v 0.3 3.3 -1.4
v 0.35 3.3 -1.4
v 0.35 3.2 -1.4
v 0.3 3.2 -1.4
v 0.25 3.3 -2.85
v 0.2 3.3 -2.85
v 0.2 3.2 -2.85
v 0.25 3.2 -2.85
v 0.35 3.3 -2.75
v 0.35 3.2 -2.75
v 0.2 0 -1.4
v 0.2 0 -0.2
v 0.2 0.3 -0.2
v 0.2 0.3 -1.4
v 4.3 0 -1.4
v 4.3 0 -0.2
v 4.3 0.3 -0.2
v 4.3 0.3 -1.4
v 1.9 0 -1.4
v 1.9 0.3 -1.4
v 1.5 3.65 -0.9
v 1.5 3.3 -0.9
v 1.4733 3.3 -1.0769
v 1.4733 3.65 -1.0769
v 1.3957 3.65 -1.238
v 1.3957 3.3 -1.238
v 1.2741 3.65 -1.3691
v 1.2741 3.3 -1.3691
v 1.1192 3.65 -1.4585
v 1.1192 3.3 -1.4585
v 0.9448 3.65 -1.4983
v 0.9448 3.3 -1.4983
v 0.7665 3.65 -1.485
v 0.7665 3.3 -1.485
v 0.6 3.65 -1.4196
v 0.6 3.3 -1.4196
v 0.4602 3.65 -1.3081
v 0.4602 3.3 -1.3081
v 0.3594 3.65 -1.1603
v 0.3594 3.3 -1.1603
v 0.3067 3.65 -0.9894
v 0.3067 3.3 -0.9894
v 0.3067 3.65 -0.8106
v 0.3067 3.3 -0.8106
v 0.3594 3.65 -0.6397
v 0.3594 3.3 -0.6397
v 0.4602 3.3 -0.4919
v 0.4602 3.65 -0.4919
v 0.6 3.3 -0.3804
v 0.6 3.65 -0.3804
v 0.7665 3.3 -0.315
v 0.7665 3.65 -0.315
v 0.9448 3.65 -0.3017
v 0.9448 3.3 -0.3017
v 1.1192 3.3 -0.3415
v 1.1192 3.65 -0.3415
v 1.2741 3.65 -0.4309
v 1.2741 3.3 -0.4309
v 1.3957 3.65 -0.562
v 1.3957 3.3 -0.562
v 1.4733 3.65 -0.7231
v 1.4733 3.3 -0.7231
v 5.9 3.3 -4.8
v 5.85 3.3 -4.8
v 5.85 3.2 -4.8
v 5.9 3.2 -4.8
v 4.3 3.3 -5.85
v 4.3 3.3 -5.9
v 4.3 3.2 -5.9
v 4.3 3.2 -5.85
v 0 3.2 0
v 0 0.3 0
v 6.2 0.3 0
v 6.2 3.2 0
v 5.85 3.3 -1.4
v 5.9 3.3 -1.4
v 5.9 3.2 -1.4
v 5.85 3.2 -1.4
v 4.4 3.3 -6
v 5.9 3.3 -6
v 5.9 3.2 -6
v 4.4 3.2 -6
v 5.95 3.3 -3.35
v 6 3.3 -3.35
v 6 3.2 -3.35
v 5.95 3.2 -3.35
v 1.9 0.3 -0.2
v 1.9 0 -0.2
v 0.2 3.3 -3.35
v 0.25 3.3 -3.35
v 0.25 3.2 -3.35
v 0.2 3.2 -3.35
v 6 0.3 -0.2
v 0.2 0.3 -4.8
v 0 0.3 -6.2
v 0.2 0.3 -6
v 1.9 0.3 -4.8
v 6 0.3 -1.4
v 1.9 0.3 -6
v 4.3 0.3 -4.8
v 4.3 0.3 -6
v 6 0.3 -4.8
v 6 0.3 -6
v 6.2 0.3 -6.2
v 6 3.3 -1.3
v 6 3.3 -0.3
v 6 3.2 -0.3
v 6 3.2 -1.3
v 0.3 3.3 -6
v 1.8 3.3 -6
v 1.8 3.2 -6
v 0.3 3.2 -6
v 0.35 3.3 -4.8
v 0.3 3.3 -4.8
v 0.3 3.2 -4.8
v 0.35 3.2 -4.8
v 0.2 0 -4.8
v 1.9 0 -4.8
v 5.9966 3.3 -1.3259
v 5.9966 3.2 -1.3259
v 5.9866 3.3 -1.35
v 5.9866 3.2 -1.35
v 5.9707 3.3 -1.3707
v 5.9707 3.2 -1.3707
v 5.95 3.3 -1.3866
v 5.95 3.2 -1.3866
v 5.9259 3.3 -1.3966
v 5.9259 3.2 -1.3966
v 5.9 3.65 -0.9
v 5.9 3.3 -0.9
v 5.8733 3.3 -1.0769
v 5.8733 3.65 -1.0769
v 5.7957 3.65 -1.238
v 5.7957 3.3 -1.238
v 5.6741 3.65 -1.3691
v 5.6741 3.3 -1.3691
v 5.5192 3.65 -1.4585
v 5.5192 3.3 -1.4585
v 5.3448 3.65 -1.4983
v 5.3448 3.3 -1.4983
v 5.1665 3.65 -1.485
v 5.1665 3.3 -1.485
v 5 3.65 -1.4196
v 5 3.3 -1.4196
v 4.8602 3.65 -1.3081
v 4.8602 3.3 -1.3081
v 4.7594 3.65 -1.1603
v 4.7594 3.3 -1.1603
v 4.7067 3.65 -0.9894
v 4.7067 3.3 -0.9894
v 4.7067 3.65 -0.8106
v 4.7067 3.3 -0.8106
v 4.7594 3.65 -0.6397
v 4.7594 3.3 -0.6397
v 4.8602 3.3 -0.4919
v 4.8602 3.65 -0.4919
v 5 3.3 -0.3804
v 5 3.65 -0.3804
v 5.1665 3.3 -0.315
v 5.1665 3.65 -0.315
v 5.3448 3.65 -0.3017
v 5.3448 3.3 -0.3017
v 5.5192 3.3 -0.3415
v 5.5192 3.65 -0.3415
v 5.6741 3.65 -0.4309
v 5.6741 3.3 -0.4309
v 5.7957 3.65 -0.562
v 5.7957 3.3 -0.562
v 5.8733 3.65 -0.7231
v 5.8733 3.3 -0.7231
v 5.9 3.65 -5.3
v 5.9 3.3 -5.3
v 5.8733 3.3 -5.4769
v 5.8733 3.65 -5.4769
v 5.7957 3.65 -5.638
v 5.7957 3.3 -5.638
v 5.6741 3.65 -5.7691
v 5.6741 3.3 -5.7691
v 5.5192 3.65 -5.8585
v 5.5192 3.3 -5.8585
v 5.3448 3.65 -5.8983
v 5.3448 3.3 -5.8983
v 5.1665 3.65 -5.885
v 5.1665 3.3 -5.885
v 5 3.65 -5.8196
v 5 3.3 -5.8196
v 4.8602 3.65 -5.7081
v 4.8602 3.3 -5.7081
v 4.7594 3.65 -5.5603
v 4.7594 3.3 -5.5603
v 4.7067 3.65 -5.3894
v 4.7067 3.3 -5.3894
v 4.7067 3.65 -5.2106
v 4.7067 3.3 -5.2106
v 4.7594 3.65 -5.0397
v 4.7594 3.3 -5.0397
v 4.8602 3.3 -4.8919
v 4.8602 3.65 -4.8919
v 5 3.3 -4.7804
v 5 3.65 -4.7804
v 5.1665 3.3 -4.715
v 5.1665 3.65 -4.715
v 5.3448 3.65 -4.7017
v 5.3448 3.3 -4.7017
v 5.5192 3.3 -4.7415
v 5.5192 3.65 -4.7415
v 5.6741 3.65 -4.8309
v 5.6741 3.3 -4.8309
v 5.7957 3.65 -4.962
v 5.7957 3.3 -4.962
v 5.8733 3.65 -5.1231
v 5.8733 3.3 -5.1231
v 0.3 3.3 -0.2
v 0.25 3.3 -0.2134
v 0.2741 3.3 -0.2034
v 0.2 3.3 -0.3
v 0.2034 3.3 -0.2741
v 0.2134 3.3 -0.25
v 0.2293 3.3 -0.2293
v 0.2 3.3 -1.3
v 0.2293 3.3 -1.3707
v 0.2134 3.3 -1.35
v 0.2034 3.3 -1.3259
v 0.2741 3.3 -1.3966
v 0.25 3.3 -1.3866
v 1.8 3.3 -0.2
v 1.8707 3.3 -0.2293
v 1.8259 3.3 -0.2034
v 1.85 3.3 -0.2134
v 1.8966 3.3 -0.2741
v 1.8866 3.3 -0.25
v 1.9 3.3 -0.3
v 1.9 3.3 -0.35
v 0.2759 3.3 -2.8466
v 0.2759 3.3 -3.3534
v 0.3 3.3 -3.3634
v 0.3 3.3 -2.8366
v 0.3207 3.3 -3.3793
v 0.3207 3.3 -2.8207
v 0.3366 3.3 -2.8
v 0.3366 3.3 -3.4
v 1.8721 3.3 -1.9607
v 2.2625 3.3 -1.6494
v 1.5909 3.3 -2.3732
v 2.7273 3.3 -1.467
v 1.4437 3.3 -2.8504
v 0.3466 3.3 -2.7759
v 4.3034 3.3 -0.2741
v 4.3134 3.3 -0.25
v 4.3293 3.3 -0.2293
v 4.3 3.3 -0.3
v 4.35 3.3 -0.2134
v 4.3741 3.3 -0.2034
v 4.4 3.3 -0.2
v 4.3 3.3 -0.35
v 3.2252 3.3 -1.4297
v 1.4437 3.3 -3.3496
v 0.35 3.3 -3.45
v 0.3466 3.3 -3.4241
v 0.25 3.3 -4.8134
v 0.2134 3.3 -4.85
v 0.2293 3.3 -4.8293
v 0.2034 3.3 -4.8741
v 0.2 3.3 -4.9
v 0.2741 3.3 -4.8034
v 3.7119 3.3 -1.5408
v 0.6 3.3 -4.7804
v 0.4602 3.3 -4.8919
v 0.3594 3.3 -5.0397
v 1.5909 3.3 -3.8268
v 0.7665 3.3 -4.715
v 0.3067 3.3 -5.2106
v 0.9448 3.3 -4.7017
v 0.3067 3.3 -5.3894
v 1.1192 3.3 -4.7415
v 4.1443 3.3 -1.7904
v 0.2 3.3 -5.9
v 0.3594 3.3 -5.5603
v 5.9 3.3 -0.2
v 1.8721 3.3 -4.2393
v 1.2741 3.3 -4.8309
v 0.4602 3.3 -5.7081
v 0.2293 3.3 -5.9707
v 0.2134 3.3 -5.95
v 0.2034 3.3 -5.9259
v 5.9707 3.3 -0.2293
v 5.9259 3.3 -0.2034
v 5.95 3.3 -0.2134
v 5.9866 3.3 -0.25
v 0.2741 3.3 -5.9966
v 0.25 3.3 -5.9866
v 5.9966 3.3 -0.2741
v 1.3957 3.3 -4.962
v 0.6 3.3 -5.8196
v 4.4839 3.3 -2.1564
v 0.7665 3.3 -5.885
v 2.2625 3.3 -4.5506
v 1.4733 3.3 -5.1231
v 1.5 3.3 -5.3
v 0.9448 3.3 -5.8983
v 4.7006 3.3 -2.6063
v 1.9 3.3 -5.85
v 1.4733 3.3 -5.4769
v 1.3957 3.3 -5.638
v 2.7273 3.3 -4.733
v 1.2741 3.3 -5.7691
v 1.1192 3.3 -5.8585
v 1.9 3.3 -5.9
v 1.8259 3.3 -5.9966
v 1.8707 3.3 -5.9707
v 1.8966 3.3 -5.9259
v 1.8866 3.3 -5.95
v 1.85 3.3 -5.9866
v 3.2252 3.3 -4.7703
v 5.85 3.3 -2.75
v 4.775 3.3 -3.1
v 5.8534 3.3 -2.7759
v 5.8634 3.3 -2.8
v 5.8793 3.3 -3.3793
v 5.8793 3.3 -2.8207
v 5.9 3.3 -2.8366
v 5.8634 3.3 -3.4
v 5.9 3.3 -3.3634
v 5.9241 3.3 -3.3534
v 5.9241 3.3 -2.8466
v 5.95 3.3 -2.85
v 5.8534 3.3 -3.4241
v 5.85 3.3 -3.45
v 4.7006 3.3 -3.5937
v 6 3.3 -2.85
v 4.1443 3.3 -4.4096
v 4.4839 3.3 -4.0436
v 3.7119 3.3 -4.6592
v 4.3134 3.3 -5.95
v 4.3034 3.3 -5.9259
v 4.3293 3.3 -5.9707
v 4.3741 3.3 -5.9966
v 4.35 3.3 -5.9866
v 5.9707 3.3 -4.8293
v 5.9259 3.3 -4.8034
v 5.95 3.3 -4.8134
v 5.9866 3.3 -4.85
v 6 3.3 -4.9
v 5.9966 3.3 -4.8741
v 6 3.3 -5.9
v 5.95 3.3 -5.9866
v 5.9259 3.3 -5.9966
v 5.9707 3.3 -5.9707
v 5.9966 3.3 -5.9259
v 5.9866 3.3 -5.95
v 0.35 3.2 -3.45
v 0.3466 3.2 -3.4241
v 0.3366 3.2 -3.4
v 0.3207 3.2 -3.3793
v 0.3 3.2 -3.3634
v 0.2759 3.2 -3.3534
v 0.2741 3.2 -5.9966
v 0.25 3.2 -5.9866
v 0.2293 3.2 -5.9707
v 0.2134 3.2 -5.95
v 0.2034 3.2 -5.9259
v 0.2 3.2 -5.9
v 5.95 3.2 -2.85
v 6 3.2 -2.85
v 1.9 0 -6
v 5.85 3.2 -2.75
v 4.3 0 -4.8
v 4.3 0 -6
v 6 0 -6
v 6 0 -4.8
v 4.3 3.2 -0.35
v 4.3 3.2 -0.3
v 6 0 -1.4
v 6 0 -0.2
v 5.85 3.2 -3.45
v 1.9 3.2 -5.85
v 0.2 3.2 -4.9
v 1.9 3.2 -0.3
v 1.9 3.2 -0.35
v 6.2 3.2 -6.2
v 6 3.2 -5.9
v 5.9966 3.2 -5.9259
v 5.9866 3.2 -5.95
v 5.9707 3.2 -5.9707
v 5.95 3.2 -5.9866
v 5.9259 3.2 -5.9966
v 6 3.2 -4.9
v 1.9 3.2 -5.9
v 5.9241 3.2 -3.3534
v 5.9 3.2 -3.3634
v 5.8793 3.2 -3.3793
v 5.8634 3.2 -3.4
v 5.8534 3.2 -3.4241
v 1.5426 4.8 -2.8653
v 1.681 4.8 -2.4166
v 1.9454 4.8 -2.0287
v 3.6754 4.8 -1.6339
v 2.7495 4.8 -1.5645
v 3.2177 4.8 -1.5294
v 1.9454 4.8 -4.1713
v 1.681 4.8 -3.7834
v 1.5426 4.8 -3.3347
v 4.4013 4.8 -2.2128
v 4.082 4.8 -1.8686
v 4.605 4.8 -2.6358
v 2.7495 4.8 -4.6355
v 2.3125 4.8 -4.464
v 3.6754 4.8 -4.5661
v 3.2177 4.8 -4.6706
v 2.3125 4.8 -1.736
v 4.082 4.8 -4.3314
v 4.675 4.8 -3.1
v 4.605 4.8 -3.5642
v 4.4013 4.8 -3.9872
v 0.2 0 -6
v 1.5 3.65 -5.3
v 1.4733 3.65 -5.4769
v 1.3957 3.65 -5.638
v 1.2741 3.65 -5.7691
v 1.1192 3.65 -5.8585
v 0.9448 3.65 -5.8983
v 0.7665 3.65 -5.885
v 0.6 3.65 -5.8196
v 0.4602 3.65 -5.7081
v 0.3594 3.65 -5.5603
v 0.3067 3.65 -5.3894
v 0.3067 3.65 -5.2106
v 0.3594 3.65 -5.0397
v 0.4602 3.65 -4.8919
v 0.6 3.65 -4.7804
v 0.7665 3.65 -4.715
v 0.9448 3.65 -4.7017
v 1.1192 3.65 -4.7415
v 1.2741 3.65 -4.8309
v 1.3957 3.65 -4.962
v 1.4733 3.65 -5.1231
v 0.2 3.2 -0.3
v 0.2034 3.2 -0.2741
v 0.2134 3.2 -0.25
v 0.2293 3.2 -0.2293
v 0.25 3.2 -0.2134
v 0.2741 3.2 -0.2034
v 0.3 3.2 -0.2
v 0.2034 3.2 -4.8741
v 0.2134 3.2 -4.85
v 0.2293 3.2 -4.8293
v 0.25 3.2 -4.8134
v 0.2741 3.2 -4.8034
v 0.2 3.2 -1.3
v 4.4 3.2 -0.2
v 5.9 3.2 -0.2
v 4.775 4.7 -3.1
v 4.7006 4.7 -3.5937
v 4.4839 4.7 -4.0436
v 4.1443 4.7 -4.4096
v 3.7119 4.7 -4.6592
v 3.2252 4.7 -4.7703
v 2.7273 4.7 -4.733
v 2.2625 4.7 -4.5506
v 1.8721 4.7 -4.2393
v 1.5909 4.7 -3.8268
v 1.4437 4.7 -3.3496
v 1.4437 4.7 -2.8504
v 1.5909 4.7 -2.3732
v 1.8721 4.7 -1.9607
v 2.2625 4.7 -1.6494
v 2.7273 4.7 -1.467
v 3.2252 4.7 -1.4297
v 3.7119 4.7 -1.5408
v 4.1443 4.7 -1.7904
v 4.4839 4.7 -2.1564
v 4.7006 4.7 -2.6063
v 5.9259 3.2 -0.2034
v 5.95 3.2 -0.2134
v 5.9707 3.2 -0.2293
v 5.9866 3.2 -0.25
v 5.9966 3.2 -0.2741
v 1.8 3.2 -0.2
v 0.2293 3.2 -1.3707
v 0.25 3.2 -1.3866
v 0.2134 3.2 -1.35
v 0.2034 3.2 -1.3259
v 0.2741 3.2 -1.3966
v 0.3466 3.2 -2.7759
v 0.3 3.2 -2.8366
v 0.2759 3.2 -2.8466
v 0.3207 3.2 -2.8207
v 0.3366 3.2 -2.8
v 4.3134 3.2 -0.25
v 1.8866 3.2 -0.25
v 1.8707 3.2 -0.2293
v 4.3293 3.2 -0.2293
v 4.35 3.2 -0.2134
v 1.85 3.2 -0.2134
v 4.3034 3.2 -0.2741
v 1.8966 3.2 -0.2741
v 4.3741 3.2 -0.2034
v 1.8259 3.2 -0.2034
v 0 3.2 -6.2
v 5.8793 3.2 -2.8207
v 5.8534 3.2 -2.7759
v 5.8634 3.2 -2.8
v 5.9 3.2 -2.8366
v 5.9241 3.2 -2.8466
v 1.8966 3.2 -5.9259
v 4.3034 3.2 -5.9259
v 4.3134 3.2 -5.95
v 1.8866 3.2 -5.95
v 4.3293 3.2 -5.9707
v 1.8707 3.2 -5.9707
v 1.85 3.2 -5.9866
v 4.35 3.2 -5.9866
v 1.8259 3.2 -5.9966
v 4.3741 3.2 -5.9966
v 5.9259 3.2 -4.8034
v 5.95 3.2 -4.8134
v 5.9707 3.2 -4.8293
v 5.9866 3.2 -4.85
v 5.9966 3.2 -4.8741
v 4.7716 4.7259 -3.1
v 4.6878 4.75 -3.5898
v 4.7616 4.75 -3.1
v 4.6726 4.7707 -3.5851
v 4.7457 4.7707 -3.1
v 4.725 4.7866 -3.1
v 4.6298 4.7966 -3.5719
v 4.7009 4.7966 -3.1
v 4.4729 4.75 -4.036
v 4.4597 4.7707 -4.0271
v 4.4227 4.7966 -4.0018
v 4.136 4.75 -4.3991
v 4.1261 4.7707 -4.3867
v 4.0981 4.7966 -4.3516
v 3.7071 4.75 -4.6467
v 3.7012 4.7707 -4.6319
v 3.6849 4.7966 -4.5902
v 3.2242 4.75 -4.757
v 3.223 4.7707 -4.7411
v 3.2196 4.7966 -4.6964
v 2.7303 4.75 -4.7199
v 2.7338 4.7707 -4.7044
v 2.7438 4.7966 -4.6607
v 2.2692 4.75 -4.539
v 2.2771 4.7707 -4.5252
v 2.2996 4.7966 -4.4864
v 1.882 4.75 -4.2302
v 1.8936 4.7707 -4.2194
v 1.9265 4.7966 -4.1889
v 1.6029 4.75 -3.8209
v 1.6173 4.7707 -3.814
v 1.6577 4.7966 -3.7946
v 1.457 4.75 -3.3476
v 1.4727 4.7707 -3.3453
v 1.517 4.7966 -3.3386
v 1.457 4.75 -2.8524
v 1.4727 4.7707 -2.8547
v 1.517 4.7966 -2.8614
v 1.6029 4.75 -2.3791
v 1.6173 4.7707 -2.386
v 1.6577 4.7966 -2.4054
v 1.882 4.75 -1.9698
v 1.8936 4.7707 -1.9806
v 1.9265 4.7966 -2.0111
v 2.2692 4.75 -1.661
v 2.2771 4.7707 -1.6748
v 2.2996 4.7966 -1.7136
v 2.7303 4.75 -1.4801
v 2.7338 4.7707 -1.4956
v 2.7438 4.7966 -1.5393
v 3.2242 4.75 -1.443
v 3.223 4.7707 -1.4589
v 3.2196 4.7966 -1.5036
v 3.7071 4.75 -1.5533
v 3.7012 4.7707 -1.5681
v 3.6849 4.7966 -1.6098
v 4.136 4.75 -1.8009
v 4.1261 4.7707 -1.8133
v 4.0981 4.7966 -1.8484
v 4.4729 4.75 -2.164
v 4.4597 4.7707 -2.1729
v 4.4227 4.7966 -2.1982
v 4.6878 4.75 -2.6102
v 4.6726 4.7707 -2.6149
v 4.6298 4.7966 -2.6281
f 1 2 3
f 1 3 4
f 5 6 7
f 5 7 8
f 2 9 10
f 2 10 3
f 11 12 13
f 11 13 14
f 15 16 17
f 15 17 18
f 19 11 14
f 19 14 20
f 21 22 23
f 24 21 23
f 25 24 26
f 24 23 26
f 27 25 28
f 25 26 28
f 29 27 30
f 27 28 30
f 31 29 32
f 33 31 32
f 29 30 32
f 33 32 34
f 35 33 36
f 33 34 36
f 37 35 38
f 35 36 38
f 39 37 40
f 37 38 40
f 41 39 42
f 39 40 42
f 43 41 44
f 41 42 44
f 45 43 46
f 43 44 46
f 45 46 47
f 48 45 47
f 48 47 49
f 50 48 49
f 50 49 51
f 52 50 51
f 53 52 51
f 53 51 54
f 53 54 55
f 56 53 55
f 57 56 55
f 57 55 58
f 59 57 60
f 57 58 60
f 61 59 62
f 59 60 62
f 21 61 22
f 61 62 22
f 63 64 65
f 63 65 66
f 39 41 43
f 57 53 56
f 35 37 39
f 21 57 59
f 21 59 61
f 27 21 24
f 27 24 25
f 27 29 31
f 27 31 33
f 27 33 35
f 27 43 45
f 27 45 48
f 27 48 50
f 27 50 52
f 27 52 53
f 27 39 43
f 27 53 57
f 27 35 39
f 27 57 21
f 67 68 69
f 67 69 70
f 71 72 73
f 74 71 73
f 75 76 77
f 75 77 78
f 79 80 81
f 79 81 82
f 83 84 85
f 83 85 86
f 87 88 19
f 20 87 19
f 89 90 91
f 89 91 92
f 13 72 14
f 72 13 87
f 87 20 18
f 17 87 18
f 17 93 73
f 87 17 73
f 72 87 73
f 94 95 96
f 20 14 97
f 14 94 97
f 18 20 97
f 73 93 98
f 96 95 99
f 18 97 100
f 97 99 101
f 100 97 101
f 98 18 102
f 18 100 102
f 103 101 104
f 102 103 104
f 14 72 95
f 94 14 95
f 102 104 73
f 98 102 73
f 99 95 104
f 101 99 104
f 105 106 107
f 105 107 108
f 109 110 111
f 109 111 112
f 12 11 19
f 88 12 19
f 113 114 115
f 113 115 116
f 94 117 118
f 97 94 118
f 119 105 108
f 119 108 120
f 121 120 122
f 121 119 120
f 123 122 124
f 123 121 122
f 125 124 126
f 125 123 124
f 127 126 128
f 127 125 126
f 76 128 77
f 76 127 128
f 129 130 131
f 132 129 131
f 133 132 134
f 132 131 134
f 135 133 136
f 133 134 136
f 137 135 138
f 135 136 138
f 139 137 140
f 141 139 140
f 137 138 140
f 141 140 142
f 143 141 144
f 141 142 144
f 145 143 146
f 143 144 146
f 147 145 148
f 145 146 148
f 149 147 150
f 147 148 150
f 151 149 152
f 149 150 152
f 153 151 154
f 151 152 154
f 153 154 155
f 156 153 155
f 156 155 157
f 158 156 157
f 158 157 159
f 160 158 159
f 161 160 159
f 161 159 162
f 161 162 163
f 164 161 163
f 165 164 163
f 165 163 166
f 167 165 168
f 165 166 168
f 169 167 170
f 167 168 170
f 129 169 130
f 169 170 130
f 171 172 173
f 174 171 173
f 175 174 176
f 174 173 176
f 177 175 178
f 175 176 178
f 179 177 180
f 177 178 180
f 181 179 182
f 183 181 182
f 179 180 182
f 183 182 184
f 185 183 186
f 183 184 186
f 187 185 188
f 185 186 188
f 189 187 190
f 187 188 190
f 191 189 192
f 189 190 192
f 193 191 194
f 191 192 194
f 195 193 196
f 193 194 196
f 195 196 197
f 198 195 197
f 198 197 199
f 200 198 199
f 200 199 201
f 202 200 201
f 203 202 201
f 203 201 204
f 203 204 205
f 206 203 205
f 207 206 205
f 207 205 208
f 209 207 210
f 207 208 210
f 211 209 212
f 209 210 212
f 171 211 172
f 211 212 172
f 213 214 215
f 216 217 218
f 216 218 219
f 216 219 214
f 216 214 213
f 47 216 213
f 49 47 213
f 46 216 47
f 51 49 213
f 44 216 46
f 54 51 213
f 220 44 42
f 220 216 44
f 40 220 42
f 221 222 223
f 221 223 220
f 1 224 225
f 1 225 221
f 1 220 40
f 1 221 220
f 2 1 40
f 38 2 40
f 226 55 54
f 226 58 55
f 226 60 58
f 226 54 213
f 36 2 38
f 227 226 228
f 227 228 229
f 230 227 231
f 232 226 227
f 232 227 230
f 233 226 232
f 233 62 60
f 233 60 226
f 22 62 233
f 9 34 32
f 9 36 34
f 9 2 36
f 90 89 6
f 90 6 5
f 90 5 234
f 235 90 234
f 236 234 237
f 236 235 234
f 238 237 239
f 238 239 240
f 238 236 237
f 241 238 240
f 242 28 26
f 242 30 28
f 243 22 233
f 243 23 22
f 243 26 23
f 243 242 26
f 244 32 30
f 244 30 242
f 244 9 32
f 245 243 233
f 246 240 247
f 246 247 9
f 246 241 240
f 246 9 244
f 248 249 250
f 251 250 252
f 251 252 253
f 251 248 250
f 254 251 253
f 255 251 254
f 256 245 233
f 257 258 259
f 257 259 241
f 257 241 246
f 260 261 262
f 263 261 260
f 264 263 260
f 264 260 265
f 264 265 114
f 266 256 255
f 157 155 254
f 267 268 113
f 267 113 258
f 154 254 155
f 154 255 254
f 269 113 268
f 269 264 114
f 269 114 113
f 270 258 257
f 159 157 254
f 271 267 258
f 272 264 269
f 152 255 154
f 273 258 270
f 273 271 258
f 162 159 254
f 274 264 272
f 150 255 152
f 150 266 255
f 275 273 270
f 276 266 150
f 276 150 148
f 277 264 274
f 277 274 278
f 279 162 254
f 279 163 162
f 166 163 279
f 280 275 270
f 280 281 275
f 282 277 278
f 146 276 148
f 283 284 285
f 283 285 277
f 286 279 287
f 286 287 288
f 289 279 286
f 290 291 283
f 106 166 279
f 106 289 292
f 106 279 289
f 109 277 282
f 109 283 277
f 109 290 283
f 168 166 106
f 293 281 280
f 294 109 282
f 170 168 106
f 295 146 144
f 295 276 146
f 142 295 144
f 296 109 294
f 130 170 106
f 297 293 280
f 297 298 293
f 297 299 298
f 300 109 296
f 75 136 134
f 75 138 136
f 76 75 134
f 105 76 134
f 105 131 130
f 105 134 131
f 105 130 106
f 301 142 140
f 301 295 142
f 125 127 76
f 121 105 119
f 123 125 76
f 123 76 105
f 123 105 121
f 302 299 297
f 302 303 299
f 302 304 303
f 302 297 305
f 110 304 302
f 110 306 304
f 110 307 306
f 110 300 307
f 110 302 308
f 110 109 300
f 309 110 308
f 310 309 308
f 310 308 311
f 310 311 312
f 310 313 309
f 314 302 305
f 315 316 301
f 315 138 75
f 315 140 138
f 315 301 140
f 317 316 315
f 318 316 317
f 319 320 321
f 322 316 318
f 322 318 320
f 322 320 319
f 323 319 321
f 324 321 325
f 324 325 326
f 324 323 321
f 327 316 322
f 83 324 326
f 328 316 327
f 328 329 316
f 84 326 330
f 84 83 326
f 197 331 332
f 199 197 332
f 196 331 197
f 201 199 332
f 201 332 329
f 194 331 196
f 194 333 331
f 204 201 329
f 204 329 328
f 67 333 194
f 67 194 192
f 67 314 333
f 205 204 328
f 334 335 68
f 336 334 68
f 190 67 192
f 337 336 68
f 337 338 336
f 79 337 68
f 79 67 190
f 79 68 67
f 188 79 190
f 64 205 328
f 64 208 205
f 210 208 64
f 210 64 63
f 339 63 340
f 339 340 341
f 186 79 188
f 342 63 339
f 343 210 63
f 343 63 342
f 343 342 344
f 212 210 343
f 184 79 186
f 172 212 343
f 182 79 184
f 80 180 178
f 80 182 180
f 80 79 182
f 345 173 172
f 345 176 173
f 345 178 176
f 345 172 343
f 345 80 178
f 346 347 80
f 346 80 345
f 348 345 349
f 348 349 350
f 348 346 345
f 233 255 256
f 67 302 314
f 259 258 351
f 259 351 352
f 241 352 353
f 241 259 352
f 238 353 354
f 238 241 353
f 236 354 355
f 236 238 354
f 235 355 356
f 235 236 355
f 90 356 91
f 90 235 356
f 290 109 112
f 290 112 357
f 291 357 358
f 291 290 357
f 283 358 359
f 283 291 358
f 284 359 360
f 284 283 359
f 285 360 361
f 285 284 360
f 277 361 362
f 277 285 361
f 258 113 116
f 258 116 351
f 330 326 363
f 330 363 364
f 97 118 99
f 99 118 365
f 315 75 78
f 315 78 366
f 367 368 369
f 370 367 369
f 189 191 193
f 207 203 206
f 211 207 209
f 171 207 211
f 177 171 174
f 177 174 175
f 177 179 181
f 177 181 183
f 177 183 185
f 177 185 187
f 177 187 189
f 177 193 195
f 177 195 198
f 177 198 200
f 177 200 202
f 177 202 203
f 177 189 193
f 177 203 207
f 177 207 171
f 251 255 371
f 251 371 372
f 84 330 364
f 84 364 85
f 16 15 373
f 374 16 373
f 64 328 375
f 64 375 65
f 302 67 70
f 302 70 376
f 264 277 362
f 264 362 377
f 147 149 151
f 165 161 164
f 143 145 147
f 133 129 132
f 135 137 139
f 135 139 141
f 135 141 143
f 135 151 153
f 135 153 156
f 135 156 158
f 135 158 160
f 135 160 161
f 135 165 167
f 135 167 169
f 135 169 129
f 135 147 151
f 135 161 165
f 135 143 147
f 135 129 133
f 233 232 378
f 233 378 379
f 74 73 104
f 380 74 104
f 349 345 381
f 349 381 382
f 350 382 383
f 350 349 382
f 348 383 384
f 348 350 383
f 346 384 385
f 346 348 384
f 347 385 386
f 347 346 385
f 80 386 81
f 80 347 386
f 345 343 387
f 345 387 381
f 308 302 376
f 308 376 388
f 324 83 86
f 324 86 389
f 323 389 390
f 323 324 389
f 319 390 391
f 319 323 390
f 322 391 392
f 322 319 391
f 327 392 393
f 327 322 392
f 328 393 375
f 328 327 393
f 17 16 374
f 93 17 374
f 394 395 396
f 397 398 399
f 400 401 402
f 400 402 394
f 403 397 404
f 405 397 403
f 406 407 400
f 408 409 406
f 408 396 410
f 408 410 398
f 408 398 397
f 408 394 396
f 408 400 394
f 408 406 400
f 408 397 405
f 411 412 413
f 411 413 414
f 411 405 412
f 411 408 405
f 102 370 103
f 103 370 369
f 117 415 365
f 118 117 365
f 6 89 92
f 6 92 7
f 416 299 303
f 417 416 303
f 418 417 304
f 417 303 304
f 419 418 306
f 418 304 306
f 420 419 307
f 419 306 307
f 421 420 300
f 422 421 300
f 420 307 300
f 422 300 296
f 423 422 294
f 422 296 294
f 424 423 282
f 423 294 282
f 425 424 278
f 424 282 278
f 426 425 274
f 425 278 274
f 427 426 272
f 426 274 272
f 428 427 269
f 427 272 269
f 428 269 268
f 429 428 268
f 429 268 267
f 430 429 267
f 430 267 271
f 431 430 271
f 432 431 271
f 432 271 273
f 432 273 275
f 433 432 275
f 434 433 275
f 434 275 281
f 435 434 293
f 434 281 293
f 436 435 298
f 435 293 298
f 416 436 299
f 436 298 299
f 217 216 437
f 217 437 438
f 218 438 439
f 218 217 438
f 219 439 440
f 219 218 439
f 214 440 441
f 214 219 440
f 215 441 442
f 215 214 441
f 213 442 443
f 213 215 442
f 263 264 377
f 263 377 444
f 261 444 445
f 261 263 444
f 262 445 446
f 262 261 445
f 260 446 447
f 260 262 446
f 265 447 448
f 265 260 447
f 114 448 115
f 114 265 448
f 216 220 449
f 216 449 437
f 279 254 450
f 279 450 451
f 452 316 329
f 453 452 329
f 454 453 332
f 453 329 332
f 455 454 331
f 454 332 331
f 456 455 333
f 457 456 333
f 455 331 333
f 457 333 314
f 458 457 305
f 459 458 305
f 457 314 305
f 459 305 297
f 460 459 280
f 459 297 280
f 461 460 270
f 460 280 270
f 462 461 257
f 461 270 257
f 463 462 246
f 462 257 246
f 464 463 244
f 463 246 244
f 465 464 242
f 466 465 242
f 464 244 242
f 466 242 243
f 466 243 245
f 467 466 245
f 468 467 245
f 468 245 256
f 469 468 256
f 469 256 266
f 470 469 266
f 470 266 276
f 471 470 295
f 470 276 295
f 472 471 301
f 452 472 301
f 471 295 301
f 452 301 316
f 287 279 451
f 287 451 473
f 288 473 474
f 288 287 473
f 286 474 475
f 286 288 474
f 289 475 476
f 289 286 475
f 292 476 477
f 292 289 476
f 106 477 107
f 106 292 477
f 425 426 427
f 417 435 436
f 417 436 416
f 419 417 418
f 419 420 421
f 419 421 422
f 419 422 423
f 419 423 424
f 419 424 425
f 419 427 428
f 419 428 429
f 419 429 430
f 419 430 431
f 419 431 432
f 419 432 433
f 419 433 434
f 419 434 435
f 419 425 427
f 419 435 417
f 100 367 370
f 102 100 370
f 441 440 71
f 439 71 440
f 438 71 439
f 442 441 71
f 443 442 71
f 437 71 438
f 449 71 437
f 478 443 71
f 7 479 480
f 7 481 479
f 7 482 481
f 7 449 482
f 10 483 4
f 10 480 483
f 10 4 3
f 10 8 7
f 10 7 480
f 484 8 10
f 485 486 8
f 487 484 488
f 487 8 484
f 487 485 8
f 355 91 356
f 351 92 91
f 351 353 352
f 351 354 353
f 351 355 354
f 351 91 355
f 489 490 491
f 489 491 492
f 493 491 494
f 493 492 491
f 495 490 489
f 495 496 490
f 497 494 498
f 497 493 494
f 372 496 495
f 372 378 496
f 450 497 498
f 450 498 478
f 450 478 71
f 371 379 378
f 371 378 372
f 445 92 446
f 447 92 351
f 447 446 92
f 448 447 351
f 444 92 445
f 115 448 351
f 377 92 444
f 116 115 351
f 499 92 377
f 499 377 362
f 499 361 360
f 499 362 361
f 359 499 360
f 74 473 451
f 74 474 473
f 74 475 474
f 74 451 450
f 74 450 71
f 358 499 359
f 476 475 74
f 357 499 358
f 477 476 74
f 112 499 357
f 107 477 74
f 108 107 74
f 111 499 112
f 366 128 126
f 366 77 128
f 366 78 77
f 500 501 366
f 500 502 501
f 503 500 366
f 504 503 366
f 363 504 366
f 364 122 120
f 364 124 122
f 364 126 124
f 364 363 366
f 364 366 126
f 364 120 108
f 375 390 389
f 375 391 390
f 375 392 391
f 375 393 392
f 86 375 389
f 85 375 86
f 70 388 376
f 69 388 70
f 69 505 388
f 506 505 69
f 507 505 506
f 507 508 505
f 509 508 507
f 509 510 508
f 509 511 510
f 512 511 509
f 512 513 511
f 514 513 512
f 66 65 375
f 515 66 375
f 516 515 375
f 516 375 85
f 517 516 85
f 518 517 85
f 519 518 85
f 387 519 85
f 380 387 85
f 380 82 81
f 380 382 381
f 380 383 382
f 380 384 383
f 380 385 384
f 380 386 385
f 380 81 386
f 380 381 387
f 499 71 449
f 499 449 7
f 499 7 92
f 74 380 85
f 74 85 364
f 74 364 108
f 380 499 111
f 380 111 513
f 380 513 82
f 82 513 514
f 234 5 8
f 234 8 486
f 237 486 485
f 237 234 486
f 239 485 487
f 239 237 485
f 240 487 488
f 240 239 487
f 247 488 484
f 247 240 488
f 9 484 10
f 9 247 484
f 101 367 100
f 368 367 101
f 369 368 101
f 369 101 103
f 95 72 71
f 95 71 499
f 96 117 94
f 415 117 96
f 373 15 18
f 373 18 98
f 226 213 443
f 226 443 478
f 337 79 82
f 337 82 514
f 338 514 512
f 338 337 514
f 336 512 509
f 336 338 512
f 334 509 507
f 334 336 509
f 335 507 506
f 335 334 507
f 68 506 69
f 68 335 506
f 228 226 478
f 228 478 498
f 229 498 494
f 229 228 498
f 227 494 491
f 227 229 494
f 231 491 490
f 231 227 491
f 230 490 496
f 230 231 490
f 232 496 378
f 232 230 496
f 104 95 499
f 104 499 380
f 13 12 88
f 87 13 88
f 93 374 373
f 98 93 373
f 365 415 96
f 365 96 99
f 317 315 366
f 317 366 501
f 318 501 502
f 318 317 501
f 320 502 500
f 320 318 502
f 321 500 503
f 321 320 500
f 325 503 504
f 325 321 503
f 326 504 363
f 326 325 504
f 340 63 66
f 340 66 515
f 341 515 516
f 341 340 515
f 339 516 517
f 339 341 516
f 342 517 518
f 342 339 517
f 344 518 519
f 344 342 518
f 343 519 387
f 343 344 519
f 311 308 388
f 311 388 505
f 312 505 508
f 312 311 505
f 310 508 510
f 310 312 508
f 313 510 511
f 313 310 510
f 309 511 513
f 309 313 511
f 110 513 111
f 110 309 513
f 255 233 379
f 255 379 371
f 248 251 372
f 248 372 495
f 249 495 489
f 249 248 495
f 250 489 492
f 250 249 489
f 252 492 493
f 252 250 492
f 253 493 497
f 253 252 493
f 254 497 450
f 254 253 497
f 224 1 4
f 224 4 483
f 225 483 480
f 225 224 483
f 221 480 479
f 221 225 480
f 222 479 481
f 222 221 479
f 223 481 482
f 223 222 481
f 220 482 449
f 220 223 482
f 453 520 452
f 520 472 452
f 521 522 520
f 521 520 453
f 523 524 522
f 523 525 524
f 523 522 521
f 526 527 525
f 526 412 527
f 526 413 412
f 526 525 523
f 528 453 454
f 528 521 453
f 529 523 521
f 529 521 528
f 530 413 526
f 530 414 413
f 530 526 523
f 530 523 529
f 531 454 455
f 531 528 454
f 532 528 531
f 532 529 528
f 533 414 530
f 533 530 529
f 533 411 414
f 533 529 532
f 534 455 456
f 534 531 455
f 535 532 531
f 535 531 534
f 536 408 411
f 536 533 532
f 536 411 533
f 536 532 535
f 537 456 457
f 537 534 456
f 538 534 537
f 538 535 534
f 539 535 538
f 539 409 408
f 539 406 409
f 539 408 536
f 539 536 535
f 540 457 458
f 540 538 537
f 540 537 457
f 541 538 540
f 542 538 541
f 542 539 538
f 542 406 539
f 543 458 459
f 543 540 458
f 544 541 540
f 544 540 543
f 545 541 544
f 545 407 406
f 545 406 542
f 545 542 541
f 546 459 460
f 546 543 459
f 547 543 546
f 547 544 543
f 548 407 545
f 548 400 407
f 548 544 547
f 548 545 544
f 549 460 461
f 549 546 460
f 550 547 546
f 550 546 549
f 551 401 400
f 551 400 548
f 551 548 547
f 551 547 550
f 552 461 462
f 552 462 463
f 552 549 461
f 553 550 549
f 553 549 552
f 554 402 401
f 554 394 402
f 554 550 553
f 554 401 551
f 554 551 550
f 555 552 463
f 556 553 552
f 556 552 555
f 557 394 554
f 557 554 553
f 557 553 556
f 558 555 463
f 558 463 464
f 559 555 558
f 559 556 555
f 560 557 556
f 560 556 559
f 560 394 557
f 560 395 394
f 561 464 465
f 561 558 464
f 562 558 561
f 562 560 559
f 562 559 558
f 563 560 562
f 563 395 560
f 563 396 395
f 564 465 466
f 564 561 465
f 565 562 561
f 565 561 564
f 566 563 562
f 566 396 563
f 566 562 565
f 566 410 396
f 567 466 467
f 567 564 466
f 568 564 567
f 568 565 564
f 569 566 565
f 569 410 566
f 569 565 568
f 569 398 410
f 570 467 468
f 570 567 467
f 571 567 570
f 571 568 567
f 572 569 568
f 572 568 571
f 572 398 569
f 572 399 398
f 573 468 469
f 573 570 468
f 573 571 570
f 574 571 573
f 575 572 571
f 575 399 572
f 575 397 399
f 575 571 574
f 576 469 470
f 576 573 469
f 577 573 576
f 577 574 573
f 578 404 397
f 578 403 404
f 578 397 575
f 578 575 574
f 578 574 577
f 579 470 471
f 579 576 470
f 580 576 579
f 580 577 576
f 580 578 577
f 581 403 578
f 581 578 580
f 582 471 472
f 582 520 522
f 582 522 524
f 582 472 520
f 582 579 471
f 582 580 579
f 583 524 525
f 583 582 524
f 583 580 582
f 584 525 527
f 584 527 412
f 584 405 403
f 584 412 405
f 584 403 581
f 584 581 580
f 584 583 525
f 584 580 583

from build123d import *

# Parameters (mm, degrees)
ESQUISSE1_W             = 1.7
ESQUISSE1_H             = 1.2
BOSS_EXTRU_1_DEPTH      = 0.3
BOSS_EXTRU_1_2_DEPTH    = 0.3
BOSS_EXTRU_1_3_DEPTH    = 0.3
BOSS_EXTRU_1_4_DEPTH    = 0.3
ESQUISSE2_W             = 6.2
ESQUISSE2_H             = 6.2
BOSS_EXTRU_2_DEPTH      = 3
ESQUISSE3_W             = 6.2
ESQUISSE3_H             = 6.2
ENL_V_MAT_EXTRU_1_DEPTH = 0.1
ESQUISSE4_R             = 0.6
BOSS_EXTRU_3_DEPTH      = 0.35
ESQUISSE5_R             = 1.675
BOSS_EXTRU_4_DEPTH      = 1.5
CONG_1_R                = 0.1


with BuildPart() as part:
    # Esquisse1 → Boss.-Extru.1 (new body)
    with BuildSketch(Plane(origin=(0, 0, 0), x_dir=(1, 0, 0), z_dir=(0, 1, 0))):
        with Locations((1.05, 5.4)):
            Rectangle(ESQUISSE1_W, ESQUISSE1_H)
    extrude(amount=BOSS_EXTRU_1_DEPTH)



with BuildPart() as body_2:
    # Esquisse1 → Boss.-Extru.1 2 (new body)
    with BuildSketch(Plane(origin=(0, 0, 0), x_dir=(1, 0, 0), z_dir=(0, 1, 0))):
        with Locations((1.05, 0.8)):
            Rectangle(ESQUISSE1_W, ESQUISSE1_H)
    extrude(amount=BOSS_EXTRU_1_2_DEPTH)


with BuildPart() as body_3:
    # Esquisse1 → Boss.-Extru.1 3 (new body)
    with BuildSketch(Plane(origin=(0, 0, 0), x_dir=(1, 0, 0), z_dir=(0, 1, 0))):
        with Locations((5.15, 0.8)):
            Rectangle(ESQUISSE1_W, ESQUISSE1_H)
    extrude(amount=BOSS_EXTRU_1_3_DEPTH)


with BuildPart() as body_4:
    # Esquisse1 → Boss.-Extru.1 4 (new body)
    with BuildSketch(Plane(origin=(0, 0, 0), x_dir=(1, 0, 0), z_dir=(0, 1, 0))):
        with Locations((5.15, 5.4)):
            Rectangle(ESQUISSE1_W, ESQUISSE1_H)
    extrude(amount=BOSS_EXTRU_1_4_DEPTH)


with BuildPart() as part_1:
    add(part.part)

    add(body_2.part)  # Boss.-Extru.2 merges body 2

    add(body_3.part)  # Boss.-Extru.2 merges body 3

    add(body_4.part)  # Boss.-Extru.2 merges body 4
    # Esquisse2 → Boss.-Extru.2 (add)
    with BuildSketch(Plane(origin=(0, 0.3, 0), x_dir=(1, 0, 0), z_dir=(0, 1, 0))):
        with Locations((3.1, 3.1)):
            Rectangle(ESQUISSE2_W, ESQUISSE2_H)
    extrude(amount=BOSS_EXTRU_2_DEPTH)

    # Esquisse3 → Enlèv. mat.-Extru.1 (cut)
    with BuildSketch(Plane(origin=(0, 3.3, 0), x_dir=(1, 0, 0), z_dir=(0, 1, 0))):
        with Locations((3.1, 3.1)):
            Rectangle(ESQUISSE3_W, ESQUISSE3_H)
        with BuildLine():
            Line((0.3, 0.2), (1.8, 0.2))
            ThreePointArc((1.8, 0.2), (1.870710678, 0.229289322), (1.9, 0.3))
            Line((1.9, 0.3), (1.9, 0.35))
            Line((1.9, 0.35), (4.3, 0.35))
            Line((4.3, 0.35), (4.3, 0.3))
            ThreePointArc((4.3, 0.3), (4.329289322, 0.229289322), (4.4, 0.2))
            Line((4.4, 0.2), (5.9, 0.2))
            ThreePointArc((5.9, 0.2), (5.970710678, 0.229289322), (6, 0.3))
            Line((6, 0.3), (6, 1.3))
            ThreePointArc((6, 1.3), (5.970710678, 1.370710678), (5.9, 1.4))
            Line((5.9, 1.4), (5.85, 1.4))
            Line((5.85, 1.4), (5.85, 2.75))
            ThreePointArc((5.85, 2.75), (5.879289322, 2.820710678), (5.95, 2.85))
            Line((5.95, 2.85), (6, 2.85))
            Line((6, 2.85), (6, 3.35))
            Line((6, 3.35), (5.95, 3.35))
            ThreePointArc((5.95, 3.35), (5.879289322, 3.379289322), (5.85, 3.45))
            Line((5.85, 3.45), (5.85, 4.8))
            Line((5.85, 4.8), (5.9, 4.8))
            ThreePointArc((5.9, 4.8), (5.970710678, 4.829289322), (6, 4.9))
            Line((6, 4.9), (6, 5.9))
            ThreePointArc((6, 5.9), (5.970710678, 5.970710678), (5.9, 6))
            Line((5.9, 6), (4.4, 6))
            ThreePointArc((4.4, 6), (4.329289322, 5.970710678), (4.3, 5.9))
            Line((4.3, 5.9), (4.3, 5.85))
            Line((4.3, 5.85), (1.9, 5.85))
            Line((1.9, 5.85), (1.9, 5.9))
            ThreePointArc((1.9, 5.9), (1.870710678, 5.970710678), (1.8, 6))
            Line((1.8, 6), (0.3, 6))
            ThreePointArc((0.3, 6), (0.229289322, 5.970710678), (0.2, 5.9))
            Line((0.2, 5.9), (0.2, 4.9))
            ThreePointArc((0.2, 4.9), (0.229289322, 4.829289322), (0.3, 4.8))
            Line((0.3, 4.8), (0.35, 4.8))
            Line((0.35, 4.8), (0.35, 3.45))
            ThreePointArc((0.35, 3.45), (0.320710678, 3.379289322), (0.25, 3.35))
            Line((0.25, 3.35), (0.2, 3.35))
            Line((0.2, 3.35), (0.2, 2.85))
            Line((0.2, 2.85), (0.25, 2.85))
            ThreePointArc((0.25, 2.85), (0.320710678, 2.820710678), (0.35, 2.75))
            Line((0.35, 2.75), (0.35, 1.4))
            Line((0.35, 1.4), (0.3, 1.4))
            ThreePointArc((0.3, 1.4), (0.229289322, 1.370710678), (0.2, 1.3))
            Line((0.2, 1.3), (0.2, 0.3))
            ThreePointArc((0.2, 0.3), (0.229289322, 0.229289322), (0.3, 0.2))
        make_face(mode=Mode.SUBTRACT)
    extrude(amount=-ENL_V_MAT_EXTRU_1_DEPTH, mode=Mode.SUBTRACT)

    # Esquisse4 → Boss.-Extru.3 (add)
    with BuildSketch(Plane(origin=(0, 3.3, 0), x_dir=(1, 0, 0), z_dir=(0, 1, 0))):
        with Locations((0.9, 5.3)):
            Circle(ESQUISSE4_R)
        with Locations((5.3, 5.3)):
            Circle(ESQUISSE4_R)
        with Locations((0.9, 0.9)):
            Circle(ESQUISSE4_R)
        with Locations((5.3, 0.9)):
            Circle(ESQUISSE4_R)
    extrude(amount=BOSS_EXTRU_3_DEPTH)

    # Esquisse5 → Boss.-Extru.4 (add)
    with BuildSketch(Plane(origin=(0, 3.3, 0), x_dir=(1, 0, 0), z_dir=(0, 1, 0))):
        with Locations((3.1, 3.1)):
            Circle(ESQUISSE5_R)
    extrude(amount=BOSS_EXTRU_4_DEPTH)

    # Congé1
    cong_1_edges = [part_1.edges().sort_by_distance(p)[0] for p in [
        (1.425, 4.8, -3.1),
    ]]
    fillet(cong_1_edges, radius=CONG_1_R)


solid = part_1.part
